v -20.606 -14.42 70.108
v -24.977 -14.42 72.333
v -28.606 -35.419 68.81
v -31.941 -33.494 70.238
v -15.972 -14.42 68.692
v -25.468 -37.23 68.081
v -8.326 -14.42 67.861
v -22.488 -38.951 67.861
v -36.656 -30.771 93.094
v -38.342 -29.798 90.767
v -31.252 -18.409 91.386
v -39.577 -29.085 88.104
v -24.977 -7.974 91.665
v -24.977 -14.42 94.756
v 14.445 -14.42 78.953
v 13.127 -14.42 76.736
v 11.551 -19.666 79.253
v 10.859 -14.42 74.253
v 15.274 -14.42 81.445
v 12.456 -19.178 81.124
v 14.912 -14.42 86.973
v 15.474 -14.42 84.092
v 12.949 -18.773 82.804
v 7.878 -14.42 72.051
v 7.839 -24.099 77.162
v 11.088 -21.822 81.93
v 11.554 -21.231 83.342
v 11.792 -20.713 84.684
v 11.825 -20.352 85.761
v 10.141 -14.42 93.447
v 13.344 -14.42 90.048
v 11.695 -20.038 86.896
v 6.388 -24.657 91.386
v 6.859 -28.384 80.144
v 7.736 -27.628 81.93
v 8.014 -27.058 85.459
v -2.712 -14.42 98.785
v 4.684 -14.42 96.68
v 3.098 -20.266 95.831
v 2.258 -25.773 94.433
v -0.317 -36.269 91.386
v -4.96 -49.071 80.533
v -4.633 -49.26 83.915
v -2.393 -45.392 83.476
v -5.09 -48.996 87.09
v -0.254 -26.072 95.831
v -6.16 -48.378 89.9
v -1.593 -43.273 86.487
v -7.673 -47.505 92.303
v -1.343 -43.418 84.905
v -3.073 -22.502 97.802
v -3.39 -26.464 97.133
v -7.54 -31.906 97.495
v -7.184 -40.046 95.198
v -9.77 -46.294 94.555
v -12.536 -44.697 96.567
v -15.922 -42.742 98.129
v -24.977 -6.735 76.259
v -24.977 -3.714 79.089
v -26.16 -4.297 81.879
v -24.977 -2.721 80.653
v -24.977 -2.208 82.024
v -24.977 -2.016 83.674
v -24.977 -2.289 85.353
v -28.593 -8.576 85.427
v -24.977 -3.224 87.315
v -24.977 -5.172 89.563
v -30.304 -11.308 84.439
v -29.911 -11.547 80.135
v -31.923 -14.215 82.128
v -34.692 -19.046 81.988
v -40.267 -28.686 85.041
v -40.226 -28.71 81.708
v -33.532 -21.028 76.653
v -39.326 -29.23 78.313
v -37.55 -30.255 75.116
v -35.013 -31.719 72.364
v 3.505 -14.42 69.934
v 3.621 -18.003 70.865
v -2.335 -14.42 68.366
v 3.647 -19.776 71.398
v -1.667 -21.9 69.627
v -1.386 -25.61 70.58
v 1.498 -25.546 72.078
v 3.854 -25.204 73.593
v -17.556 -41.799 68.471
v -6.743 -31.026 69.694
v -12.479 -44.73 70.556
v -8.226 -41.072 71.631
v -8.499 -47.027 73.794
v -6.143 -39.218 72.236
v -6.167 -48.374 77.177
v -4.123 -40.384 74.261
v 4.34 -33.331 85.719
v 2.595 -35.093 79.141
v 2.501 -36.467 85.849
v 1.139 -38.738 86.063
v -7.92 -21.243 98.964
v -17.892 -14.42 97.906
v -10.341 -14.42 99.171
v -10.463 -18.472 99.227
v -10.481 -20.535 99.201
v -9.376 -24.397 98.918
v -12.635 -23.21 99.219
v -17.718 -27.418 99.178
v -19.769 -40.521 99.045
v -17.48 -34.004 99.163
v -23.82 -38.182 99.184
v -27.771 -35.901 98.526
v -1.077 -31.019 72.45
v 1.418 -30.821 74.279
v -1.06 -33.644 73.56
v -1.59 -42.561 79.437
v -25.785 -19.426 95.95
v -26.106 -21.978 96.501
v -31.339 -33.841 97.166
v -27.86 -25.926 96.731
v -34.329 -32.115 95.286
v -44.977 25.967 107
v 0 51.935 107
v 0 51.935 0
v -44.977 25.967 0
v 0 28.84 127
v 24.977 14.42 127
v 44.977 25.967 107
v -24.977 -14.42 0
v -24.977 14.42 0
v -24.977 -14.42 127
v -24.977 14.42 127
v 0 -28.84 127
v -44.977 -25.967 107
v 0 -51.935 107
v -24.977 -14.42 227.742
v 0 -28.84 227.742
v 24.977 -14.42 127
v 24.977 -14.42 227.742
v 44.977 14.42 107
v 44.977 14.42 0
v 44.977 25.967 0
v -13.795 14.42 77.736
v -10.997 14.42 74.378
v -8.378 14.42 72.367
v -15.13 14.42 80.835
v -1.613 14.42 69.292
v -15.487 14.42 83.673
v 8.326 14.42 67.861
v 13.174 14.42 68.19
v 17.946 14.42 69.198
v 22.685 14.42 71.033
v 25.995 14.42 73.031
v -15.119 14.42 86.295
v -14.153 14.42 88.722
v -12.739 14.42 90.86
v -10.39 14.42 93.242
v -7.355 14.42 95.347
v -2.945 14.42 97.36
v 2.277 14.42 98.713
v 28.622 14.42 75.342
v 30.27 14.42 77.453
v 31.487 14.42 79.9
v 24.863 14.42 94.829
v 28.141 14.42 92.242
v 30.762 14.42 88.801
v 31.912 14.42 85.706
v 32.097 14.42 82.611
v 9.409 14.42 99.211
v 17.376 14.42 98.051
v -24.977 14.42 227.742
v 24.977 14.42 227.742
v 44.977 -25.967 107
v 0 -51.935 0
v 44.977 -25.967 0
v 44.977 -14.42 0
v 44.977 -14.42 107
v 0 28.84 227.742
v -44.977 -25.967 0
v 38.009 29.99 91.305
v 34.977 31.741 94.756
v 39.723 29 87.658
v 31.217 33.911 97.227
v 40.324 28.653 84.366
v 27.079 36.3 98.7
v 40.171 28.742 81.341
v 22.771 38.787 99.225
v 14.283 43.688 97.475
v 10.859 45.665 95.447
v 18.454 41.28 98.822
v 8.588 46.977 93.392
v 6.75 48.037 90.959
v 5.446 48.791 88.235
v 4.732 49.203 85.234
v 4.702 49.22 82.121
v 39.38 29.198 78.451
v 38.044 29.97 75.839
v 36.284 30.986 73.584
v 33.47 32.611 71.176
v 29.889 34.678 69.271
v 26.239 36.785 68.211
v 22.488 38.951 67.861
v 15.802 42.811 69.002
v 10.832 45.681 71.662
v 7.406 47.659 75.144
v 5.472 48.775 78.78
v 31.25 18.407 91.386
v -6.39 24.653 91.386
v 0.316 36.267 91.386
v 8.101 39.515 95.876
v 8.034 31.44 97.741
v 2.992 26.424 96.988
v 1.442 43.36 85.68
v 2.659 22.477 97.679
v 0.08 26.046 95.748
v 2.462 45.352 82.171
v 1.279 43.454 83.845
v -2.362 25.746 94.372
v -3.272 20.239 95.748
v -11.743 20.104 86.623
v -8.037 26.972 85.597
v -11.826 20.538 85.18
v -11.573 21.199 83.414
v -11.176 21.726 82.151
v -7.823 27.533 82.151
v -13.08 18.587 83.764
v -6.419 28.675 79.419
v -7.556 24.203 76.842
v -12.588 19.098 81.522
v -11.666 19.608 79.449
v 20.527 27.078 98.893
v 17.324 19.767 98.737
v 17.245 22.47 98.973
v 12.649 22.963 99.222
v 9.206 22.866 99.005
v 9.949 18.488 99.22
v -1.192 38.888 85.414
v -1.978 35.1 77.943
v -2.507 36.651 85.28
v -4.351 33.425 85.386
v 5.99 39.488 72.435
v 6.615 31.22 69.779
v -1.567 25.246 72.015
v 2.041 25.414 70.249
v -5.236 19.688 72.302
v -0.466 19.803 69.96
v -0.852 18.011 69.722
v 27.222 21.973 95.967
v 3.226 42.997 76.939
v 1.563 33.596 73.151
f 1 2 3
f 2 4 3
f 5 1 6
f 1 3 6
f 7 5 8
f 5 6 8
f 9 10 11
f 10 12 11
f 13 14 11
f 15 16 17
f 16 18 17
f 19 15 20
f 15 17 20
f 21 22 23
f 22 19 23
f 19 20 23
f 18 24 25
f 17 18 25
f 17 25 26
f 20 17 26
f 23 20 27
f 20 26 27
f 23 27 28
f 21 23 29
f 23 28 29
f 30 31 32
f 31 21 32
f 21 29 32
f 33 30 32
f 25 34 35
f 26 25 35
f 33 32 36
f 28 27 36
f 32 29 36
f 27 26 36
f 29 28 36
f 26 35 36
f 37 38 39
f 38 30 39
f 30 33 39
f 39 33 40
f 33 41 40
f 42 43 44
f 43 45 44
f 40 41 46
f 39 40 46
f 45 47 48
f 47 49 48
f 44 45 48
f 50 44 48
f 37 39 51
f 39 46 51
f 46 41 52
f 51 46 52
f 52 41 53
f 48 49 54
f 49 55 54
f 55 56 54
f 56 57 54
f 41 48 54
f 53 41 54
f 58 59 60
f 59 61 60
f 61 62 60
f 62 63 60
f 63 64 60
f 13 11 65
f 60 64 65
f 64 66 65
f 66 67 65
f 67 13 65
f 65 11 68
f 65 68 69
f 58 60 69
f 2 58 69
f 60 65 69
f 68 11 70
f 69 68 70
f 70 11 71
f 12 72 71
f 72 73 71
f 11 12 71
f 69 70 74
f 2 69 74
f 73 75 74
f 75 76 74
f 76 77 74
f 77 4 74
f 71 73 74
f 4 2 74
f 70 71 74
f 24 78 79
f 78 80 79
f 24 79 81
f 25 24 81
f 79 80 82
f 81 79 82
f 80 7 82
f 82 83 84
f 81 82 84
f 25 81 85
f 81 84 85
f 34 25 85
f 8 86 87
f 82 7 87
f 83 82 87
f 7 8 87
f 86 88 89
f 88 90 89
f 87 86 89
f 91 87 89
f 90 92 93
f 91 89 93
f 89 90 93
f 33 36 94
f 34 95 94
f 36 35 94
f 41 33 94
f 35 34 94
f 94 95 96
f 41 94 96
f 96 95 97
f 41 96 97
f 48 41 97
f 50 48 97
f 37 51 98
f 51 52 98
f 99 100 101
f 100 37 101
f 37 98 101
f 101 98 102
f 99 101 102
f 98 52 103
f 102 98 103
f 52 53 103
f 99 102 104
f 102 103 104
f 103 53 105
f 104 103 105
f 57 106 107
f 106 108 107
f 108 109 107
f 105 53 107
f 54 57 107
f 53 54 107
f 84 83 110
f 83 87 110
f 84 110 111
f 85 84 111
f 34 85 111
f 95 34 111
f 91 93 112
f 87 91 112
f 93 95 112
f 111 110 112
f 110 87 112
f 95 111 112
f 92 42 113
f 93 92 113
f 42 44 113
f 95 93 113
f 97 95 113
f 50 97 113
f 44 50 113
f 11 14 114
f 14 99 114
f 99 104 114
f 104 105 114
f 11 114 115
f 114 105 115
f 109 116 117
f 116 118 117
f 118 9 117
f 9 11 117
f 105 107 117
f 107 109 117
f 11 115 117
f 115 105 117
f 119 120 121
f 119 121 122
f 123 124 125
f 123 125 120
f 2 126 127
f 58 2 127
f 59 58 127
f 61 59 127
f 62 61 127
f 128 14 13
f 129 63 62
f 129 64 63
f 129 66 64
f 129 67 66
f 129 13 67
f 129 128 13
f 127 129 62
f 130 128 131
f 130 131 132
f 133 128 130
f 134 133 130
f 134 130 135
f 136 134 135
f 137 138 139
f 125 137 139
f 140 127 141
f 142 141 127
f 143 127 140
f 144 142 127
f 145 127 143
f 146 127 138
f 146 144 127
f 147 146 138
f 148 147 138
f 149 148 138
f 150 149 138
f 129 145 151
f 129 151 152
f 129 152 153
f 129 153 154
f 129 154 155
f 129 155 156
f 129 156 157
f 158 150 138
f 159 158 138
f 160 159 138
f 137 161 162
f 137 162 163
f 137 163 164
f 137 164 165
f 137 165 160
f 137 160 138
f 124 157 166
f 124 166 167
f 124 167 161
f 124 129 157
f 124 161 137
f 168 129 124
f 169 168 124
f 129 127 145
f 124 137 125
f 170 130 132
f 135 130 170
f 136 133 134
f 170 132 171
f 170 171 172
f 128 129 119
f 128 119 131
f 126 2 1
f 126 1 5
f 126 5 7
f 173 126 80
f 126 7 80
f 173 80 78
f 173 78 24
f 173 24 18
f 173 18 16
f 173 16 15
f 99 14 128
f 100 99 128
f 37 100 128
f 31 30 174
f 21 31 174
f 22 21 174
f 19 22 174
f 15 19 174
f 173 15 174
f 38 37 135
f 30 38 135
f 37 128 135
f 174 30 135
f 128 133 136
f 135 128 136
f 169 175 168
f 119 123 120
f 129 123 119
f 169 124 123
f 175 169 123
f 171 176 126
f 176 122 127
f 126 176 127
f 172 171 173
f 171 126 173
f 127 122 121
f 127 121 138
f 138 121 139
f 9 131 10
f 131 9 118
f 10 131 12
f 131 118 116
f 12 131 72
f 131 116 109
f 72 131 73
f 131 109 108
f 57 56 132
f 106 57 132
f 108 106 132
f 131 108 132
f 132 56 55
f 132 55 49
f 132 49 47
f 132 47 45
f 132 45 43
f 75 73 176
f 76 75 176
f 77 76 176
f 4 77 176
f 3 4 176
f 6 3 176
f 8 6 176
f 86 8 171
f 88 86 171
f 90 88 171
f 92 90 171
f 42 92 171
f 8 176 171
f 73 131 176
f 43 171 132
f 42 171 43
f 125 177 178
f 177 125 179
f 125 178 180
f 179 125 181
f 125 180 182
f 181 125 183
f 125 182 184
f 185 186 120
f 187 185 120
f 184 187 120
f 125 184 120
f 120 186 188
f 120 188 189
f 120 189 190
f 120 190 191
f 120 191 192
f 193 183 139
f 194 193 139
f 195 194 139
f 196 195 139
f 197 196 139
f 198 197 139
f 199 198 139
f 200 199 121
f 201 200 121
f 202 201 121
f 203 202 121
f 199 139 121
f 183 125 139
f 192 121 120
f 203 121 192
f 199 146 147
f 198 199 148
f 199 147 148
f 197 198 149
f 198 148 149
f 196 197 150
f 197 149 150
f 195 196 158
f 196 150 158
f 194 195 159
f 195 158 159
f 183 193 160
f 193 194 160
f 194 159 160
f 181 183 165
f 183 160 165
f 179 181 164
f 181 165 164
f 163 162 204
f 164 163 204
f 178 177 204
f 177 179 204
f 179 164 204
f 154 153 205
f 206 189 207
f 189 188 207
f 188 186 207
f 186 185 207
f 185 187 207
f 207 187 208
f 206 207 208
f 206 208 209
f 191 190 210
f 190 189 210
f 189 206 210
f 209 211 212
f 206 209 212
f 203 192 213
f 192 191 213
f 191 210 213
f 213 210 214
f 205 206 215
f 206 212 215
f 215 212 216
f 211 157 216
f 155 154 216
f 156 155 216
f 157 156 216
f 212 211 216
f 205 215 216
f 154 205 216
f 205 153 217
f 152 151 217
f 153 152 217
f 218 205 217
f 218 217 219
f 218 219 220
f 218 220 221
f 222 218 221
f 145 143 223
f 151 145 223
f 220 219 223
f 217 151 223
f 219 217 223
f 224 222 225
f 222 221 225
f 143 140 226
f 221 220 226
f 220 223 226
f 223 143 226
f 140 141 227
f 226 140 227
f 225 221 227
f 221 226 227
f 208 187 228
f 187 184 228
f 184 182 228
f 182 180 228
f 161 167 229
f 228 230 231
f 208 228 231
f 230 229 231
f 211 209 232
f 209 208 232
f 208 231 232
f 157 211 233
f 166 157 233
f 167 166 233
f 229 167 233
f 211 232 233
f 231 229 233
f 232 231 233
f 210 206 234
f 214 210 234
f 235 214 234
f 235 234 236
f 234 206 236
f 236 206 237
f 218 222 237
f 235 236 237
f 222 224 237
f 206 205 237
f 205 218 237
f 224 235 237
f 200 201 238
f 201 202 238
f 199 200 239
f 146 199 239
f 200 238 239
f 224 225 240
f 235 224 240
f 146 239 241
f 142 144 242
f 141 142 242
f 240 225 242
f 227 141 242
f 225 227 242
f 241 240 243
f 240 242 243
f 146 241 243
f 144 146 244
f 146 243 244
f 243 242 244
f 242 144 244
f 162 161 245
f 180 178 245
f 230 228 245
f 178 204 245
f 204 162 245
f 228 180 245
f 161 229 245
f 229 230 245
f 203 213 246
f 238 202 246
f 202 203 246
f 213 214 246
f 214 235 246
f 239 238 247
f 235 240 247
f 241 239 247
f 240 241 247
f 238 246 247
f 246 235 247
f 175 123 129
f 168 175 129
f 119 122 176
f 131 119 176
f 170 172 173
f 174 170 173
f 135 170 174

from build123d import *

# Parameters (mm, degrees)
F1_DEPTH  = 127
F2_SIZE   = 20
F3_DEPTH  = 100.7419452071
F4_W      = 73.9247704289
F4_H      = 28.8404997019
F5_DEPTH  = 227.7429452071
F10_DEPTH = 112.4425134991


# Not quite as in the source:
# - the program builds the solid bodies; features that only make, move or delete a surface that nothing else refers to are left out


with BuildPart() as f1:
    # F0 (on Top) → F1 (new body)
    with BuildSketch(Plane.XY):
        Polygon((-44.9766053996, -25.9672552347), (0, -51.9345104694), (44.9766053996, -25.9672552347), (44.9766053996, 25.9672552347), (0, 51.9345104694), (-44.9766053996, 25.9672552347), align=None)
    extrude(amount=F1_DEPTH)

    # F2
    f2_edges = [f1.edges().sort_by_distance(p)[0] for p in [
        (-44.976605, 0, 127),
        (-22.488303, 38.950883, 127),
        (22.488303, 38.950883, 127),
        (44.976605, 0, 127),
        (22.488303, -38.950883, 127),
        (-22.488303, -38.950883, 127),
    ]]
    chamfer(f2_edges, length=F2_SIZE)

    # F3 (add): a face of the model
    f3_faces = [f1.faces().sort_by_distance(p)[0] for p in [
        (0, 0, 127),
    ]]
    extrude(f3_faces, amount=F3_DEPTH)

    # F4 (on face) → F5 (cut, through all)
    with BuildSketch(Plane.XY.offset(227.7419452071)):
        with Locations((11.9857798148, 0)):
            Rectangle(F4_W, F4_H)
    extrude(amount=-F5_DEPTH, mode=Mode.SUBTRACT)

    # F8 (on face) → F10 (cut, through all)
    with BuildSketch(Plane(origin=(-22.4883026998, -38.9508828521, 0), x_dir=(0.8660254038, -0.5, 0), z_dir=(-0.5, -0.8660254038, 0))):
        with BuildLine():
            add(Edge.make_bspline(
                [(0, 67.8614079952), (35.7205863144, 67.8614079952), (17.8602931572, 91.3859009743), (0, 114.9103939533), (-17.8602931572, 91.3859009743), (-35.7205863144, 67.8614079952), (0, 67.8614079952)],
                knots=[4.7123889804, 4.7123889804, 4.7123889804, 6.8067840828, 6.8067840828, 8.9011791852, 8.9011791852, 10.9955742876, 10.9955742876, 10.9955742876], degree=2, weights=[1, 0.5, 1, 0.5, 1, 0.5, 1]))
        make_face()
    extrude(amount=-F10_DEPTH, mode=Mode.SUBTRACT)


solid = f1.part
